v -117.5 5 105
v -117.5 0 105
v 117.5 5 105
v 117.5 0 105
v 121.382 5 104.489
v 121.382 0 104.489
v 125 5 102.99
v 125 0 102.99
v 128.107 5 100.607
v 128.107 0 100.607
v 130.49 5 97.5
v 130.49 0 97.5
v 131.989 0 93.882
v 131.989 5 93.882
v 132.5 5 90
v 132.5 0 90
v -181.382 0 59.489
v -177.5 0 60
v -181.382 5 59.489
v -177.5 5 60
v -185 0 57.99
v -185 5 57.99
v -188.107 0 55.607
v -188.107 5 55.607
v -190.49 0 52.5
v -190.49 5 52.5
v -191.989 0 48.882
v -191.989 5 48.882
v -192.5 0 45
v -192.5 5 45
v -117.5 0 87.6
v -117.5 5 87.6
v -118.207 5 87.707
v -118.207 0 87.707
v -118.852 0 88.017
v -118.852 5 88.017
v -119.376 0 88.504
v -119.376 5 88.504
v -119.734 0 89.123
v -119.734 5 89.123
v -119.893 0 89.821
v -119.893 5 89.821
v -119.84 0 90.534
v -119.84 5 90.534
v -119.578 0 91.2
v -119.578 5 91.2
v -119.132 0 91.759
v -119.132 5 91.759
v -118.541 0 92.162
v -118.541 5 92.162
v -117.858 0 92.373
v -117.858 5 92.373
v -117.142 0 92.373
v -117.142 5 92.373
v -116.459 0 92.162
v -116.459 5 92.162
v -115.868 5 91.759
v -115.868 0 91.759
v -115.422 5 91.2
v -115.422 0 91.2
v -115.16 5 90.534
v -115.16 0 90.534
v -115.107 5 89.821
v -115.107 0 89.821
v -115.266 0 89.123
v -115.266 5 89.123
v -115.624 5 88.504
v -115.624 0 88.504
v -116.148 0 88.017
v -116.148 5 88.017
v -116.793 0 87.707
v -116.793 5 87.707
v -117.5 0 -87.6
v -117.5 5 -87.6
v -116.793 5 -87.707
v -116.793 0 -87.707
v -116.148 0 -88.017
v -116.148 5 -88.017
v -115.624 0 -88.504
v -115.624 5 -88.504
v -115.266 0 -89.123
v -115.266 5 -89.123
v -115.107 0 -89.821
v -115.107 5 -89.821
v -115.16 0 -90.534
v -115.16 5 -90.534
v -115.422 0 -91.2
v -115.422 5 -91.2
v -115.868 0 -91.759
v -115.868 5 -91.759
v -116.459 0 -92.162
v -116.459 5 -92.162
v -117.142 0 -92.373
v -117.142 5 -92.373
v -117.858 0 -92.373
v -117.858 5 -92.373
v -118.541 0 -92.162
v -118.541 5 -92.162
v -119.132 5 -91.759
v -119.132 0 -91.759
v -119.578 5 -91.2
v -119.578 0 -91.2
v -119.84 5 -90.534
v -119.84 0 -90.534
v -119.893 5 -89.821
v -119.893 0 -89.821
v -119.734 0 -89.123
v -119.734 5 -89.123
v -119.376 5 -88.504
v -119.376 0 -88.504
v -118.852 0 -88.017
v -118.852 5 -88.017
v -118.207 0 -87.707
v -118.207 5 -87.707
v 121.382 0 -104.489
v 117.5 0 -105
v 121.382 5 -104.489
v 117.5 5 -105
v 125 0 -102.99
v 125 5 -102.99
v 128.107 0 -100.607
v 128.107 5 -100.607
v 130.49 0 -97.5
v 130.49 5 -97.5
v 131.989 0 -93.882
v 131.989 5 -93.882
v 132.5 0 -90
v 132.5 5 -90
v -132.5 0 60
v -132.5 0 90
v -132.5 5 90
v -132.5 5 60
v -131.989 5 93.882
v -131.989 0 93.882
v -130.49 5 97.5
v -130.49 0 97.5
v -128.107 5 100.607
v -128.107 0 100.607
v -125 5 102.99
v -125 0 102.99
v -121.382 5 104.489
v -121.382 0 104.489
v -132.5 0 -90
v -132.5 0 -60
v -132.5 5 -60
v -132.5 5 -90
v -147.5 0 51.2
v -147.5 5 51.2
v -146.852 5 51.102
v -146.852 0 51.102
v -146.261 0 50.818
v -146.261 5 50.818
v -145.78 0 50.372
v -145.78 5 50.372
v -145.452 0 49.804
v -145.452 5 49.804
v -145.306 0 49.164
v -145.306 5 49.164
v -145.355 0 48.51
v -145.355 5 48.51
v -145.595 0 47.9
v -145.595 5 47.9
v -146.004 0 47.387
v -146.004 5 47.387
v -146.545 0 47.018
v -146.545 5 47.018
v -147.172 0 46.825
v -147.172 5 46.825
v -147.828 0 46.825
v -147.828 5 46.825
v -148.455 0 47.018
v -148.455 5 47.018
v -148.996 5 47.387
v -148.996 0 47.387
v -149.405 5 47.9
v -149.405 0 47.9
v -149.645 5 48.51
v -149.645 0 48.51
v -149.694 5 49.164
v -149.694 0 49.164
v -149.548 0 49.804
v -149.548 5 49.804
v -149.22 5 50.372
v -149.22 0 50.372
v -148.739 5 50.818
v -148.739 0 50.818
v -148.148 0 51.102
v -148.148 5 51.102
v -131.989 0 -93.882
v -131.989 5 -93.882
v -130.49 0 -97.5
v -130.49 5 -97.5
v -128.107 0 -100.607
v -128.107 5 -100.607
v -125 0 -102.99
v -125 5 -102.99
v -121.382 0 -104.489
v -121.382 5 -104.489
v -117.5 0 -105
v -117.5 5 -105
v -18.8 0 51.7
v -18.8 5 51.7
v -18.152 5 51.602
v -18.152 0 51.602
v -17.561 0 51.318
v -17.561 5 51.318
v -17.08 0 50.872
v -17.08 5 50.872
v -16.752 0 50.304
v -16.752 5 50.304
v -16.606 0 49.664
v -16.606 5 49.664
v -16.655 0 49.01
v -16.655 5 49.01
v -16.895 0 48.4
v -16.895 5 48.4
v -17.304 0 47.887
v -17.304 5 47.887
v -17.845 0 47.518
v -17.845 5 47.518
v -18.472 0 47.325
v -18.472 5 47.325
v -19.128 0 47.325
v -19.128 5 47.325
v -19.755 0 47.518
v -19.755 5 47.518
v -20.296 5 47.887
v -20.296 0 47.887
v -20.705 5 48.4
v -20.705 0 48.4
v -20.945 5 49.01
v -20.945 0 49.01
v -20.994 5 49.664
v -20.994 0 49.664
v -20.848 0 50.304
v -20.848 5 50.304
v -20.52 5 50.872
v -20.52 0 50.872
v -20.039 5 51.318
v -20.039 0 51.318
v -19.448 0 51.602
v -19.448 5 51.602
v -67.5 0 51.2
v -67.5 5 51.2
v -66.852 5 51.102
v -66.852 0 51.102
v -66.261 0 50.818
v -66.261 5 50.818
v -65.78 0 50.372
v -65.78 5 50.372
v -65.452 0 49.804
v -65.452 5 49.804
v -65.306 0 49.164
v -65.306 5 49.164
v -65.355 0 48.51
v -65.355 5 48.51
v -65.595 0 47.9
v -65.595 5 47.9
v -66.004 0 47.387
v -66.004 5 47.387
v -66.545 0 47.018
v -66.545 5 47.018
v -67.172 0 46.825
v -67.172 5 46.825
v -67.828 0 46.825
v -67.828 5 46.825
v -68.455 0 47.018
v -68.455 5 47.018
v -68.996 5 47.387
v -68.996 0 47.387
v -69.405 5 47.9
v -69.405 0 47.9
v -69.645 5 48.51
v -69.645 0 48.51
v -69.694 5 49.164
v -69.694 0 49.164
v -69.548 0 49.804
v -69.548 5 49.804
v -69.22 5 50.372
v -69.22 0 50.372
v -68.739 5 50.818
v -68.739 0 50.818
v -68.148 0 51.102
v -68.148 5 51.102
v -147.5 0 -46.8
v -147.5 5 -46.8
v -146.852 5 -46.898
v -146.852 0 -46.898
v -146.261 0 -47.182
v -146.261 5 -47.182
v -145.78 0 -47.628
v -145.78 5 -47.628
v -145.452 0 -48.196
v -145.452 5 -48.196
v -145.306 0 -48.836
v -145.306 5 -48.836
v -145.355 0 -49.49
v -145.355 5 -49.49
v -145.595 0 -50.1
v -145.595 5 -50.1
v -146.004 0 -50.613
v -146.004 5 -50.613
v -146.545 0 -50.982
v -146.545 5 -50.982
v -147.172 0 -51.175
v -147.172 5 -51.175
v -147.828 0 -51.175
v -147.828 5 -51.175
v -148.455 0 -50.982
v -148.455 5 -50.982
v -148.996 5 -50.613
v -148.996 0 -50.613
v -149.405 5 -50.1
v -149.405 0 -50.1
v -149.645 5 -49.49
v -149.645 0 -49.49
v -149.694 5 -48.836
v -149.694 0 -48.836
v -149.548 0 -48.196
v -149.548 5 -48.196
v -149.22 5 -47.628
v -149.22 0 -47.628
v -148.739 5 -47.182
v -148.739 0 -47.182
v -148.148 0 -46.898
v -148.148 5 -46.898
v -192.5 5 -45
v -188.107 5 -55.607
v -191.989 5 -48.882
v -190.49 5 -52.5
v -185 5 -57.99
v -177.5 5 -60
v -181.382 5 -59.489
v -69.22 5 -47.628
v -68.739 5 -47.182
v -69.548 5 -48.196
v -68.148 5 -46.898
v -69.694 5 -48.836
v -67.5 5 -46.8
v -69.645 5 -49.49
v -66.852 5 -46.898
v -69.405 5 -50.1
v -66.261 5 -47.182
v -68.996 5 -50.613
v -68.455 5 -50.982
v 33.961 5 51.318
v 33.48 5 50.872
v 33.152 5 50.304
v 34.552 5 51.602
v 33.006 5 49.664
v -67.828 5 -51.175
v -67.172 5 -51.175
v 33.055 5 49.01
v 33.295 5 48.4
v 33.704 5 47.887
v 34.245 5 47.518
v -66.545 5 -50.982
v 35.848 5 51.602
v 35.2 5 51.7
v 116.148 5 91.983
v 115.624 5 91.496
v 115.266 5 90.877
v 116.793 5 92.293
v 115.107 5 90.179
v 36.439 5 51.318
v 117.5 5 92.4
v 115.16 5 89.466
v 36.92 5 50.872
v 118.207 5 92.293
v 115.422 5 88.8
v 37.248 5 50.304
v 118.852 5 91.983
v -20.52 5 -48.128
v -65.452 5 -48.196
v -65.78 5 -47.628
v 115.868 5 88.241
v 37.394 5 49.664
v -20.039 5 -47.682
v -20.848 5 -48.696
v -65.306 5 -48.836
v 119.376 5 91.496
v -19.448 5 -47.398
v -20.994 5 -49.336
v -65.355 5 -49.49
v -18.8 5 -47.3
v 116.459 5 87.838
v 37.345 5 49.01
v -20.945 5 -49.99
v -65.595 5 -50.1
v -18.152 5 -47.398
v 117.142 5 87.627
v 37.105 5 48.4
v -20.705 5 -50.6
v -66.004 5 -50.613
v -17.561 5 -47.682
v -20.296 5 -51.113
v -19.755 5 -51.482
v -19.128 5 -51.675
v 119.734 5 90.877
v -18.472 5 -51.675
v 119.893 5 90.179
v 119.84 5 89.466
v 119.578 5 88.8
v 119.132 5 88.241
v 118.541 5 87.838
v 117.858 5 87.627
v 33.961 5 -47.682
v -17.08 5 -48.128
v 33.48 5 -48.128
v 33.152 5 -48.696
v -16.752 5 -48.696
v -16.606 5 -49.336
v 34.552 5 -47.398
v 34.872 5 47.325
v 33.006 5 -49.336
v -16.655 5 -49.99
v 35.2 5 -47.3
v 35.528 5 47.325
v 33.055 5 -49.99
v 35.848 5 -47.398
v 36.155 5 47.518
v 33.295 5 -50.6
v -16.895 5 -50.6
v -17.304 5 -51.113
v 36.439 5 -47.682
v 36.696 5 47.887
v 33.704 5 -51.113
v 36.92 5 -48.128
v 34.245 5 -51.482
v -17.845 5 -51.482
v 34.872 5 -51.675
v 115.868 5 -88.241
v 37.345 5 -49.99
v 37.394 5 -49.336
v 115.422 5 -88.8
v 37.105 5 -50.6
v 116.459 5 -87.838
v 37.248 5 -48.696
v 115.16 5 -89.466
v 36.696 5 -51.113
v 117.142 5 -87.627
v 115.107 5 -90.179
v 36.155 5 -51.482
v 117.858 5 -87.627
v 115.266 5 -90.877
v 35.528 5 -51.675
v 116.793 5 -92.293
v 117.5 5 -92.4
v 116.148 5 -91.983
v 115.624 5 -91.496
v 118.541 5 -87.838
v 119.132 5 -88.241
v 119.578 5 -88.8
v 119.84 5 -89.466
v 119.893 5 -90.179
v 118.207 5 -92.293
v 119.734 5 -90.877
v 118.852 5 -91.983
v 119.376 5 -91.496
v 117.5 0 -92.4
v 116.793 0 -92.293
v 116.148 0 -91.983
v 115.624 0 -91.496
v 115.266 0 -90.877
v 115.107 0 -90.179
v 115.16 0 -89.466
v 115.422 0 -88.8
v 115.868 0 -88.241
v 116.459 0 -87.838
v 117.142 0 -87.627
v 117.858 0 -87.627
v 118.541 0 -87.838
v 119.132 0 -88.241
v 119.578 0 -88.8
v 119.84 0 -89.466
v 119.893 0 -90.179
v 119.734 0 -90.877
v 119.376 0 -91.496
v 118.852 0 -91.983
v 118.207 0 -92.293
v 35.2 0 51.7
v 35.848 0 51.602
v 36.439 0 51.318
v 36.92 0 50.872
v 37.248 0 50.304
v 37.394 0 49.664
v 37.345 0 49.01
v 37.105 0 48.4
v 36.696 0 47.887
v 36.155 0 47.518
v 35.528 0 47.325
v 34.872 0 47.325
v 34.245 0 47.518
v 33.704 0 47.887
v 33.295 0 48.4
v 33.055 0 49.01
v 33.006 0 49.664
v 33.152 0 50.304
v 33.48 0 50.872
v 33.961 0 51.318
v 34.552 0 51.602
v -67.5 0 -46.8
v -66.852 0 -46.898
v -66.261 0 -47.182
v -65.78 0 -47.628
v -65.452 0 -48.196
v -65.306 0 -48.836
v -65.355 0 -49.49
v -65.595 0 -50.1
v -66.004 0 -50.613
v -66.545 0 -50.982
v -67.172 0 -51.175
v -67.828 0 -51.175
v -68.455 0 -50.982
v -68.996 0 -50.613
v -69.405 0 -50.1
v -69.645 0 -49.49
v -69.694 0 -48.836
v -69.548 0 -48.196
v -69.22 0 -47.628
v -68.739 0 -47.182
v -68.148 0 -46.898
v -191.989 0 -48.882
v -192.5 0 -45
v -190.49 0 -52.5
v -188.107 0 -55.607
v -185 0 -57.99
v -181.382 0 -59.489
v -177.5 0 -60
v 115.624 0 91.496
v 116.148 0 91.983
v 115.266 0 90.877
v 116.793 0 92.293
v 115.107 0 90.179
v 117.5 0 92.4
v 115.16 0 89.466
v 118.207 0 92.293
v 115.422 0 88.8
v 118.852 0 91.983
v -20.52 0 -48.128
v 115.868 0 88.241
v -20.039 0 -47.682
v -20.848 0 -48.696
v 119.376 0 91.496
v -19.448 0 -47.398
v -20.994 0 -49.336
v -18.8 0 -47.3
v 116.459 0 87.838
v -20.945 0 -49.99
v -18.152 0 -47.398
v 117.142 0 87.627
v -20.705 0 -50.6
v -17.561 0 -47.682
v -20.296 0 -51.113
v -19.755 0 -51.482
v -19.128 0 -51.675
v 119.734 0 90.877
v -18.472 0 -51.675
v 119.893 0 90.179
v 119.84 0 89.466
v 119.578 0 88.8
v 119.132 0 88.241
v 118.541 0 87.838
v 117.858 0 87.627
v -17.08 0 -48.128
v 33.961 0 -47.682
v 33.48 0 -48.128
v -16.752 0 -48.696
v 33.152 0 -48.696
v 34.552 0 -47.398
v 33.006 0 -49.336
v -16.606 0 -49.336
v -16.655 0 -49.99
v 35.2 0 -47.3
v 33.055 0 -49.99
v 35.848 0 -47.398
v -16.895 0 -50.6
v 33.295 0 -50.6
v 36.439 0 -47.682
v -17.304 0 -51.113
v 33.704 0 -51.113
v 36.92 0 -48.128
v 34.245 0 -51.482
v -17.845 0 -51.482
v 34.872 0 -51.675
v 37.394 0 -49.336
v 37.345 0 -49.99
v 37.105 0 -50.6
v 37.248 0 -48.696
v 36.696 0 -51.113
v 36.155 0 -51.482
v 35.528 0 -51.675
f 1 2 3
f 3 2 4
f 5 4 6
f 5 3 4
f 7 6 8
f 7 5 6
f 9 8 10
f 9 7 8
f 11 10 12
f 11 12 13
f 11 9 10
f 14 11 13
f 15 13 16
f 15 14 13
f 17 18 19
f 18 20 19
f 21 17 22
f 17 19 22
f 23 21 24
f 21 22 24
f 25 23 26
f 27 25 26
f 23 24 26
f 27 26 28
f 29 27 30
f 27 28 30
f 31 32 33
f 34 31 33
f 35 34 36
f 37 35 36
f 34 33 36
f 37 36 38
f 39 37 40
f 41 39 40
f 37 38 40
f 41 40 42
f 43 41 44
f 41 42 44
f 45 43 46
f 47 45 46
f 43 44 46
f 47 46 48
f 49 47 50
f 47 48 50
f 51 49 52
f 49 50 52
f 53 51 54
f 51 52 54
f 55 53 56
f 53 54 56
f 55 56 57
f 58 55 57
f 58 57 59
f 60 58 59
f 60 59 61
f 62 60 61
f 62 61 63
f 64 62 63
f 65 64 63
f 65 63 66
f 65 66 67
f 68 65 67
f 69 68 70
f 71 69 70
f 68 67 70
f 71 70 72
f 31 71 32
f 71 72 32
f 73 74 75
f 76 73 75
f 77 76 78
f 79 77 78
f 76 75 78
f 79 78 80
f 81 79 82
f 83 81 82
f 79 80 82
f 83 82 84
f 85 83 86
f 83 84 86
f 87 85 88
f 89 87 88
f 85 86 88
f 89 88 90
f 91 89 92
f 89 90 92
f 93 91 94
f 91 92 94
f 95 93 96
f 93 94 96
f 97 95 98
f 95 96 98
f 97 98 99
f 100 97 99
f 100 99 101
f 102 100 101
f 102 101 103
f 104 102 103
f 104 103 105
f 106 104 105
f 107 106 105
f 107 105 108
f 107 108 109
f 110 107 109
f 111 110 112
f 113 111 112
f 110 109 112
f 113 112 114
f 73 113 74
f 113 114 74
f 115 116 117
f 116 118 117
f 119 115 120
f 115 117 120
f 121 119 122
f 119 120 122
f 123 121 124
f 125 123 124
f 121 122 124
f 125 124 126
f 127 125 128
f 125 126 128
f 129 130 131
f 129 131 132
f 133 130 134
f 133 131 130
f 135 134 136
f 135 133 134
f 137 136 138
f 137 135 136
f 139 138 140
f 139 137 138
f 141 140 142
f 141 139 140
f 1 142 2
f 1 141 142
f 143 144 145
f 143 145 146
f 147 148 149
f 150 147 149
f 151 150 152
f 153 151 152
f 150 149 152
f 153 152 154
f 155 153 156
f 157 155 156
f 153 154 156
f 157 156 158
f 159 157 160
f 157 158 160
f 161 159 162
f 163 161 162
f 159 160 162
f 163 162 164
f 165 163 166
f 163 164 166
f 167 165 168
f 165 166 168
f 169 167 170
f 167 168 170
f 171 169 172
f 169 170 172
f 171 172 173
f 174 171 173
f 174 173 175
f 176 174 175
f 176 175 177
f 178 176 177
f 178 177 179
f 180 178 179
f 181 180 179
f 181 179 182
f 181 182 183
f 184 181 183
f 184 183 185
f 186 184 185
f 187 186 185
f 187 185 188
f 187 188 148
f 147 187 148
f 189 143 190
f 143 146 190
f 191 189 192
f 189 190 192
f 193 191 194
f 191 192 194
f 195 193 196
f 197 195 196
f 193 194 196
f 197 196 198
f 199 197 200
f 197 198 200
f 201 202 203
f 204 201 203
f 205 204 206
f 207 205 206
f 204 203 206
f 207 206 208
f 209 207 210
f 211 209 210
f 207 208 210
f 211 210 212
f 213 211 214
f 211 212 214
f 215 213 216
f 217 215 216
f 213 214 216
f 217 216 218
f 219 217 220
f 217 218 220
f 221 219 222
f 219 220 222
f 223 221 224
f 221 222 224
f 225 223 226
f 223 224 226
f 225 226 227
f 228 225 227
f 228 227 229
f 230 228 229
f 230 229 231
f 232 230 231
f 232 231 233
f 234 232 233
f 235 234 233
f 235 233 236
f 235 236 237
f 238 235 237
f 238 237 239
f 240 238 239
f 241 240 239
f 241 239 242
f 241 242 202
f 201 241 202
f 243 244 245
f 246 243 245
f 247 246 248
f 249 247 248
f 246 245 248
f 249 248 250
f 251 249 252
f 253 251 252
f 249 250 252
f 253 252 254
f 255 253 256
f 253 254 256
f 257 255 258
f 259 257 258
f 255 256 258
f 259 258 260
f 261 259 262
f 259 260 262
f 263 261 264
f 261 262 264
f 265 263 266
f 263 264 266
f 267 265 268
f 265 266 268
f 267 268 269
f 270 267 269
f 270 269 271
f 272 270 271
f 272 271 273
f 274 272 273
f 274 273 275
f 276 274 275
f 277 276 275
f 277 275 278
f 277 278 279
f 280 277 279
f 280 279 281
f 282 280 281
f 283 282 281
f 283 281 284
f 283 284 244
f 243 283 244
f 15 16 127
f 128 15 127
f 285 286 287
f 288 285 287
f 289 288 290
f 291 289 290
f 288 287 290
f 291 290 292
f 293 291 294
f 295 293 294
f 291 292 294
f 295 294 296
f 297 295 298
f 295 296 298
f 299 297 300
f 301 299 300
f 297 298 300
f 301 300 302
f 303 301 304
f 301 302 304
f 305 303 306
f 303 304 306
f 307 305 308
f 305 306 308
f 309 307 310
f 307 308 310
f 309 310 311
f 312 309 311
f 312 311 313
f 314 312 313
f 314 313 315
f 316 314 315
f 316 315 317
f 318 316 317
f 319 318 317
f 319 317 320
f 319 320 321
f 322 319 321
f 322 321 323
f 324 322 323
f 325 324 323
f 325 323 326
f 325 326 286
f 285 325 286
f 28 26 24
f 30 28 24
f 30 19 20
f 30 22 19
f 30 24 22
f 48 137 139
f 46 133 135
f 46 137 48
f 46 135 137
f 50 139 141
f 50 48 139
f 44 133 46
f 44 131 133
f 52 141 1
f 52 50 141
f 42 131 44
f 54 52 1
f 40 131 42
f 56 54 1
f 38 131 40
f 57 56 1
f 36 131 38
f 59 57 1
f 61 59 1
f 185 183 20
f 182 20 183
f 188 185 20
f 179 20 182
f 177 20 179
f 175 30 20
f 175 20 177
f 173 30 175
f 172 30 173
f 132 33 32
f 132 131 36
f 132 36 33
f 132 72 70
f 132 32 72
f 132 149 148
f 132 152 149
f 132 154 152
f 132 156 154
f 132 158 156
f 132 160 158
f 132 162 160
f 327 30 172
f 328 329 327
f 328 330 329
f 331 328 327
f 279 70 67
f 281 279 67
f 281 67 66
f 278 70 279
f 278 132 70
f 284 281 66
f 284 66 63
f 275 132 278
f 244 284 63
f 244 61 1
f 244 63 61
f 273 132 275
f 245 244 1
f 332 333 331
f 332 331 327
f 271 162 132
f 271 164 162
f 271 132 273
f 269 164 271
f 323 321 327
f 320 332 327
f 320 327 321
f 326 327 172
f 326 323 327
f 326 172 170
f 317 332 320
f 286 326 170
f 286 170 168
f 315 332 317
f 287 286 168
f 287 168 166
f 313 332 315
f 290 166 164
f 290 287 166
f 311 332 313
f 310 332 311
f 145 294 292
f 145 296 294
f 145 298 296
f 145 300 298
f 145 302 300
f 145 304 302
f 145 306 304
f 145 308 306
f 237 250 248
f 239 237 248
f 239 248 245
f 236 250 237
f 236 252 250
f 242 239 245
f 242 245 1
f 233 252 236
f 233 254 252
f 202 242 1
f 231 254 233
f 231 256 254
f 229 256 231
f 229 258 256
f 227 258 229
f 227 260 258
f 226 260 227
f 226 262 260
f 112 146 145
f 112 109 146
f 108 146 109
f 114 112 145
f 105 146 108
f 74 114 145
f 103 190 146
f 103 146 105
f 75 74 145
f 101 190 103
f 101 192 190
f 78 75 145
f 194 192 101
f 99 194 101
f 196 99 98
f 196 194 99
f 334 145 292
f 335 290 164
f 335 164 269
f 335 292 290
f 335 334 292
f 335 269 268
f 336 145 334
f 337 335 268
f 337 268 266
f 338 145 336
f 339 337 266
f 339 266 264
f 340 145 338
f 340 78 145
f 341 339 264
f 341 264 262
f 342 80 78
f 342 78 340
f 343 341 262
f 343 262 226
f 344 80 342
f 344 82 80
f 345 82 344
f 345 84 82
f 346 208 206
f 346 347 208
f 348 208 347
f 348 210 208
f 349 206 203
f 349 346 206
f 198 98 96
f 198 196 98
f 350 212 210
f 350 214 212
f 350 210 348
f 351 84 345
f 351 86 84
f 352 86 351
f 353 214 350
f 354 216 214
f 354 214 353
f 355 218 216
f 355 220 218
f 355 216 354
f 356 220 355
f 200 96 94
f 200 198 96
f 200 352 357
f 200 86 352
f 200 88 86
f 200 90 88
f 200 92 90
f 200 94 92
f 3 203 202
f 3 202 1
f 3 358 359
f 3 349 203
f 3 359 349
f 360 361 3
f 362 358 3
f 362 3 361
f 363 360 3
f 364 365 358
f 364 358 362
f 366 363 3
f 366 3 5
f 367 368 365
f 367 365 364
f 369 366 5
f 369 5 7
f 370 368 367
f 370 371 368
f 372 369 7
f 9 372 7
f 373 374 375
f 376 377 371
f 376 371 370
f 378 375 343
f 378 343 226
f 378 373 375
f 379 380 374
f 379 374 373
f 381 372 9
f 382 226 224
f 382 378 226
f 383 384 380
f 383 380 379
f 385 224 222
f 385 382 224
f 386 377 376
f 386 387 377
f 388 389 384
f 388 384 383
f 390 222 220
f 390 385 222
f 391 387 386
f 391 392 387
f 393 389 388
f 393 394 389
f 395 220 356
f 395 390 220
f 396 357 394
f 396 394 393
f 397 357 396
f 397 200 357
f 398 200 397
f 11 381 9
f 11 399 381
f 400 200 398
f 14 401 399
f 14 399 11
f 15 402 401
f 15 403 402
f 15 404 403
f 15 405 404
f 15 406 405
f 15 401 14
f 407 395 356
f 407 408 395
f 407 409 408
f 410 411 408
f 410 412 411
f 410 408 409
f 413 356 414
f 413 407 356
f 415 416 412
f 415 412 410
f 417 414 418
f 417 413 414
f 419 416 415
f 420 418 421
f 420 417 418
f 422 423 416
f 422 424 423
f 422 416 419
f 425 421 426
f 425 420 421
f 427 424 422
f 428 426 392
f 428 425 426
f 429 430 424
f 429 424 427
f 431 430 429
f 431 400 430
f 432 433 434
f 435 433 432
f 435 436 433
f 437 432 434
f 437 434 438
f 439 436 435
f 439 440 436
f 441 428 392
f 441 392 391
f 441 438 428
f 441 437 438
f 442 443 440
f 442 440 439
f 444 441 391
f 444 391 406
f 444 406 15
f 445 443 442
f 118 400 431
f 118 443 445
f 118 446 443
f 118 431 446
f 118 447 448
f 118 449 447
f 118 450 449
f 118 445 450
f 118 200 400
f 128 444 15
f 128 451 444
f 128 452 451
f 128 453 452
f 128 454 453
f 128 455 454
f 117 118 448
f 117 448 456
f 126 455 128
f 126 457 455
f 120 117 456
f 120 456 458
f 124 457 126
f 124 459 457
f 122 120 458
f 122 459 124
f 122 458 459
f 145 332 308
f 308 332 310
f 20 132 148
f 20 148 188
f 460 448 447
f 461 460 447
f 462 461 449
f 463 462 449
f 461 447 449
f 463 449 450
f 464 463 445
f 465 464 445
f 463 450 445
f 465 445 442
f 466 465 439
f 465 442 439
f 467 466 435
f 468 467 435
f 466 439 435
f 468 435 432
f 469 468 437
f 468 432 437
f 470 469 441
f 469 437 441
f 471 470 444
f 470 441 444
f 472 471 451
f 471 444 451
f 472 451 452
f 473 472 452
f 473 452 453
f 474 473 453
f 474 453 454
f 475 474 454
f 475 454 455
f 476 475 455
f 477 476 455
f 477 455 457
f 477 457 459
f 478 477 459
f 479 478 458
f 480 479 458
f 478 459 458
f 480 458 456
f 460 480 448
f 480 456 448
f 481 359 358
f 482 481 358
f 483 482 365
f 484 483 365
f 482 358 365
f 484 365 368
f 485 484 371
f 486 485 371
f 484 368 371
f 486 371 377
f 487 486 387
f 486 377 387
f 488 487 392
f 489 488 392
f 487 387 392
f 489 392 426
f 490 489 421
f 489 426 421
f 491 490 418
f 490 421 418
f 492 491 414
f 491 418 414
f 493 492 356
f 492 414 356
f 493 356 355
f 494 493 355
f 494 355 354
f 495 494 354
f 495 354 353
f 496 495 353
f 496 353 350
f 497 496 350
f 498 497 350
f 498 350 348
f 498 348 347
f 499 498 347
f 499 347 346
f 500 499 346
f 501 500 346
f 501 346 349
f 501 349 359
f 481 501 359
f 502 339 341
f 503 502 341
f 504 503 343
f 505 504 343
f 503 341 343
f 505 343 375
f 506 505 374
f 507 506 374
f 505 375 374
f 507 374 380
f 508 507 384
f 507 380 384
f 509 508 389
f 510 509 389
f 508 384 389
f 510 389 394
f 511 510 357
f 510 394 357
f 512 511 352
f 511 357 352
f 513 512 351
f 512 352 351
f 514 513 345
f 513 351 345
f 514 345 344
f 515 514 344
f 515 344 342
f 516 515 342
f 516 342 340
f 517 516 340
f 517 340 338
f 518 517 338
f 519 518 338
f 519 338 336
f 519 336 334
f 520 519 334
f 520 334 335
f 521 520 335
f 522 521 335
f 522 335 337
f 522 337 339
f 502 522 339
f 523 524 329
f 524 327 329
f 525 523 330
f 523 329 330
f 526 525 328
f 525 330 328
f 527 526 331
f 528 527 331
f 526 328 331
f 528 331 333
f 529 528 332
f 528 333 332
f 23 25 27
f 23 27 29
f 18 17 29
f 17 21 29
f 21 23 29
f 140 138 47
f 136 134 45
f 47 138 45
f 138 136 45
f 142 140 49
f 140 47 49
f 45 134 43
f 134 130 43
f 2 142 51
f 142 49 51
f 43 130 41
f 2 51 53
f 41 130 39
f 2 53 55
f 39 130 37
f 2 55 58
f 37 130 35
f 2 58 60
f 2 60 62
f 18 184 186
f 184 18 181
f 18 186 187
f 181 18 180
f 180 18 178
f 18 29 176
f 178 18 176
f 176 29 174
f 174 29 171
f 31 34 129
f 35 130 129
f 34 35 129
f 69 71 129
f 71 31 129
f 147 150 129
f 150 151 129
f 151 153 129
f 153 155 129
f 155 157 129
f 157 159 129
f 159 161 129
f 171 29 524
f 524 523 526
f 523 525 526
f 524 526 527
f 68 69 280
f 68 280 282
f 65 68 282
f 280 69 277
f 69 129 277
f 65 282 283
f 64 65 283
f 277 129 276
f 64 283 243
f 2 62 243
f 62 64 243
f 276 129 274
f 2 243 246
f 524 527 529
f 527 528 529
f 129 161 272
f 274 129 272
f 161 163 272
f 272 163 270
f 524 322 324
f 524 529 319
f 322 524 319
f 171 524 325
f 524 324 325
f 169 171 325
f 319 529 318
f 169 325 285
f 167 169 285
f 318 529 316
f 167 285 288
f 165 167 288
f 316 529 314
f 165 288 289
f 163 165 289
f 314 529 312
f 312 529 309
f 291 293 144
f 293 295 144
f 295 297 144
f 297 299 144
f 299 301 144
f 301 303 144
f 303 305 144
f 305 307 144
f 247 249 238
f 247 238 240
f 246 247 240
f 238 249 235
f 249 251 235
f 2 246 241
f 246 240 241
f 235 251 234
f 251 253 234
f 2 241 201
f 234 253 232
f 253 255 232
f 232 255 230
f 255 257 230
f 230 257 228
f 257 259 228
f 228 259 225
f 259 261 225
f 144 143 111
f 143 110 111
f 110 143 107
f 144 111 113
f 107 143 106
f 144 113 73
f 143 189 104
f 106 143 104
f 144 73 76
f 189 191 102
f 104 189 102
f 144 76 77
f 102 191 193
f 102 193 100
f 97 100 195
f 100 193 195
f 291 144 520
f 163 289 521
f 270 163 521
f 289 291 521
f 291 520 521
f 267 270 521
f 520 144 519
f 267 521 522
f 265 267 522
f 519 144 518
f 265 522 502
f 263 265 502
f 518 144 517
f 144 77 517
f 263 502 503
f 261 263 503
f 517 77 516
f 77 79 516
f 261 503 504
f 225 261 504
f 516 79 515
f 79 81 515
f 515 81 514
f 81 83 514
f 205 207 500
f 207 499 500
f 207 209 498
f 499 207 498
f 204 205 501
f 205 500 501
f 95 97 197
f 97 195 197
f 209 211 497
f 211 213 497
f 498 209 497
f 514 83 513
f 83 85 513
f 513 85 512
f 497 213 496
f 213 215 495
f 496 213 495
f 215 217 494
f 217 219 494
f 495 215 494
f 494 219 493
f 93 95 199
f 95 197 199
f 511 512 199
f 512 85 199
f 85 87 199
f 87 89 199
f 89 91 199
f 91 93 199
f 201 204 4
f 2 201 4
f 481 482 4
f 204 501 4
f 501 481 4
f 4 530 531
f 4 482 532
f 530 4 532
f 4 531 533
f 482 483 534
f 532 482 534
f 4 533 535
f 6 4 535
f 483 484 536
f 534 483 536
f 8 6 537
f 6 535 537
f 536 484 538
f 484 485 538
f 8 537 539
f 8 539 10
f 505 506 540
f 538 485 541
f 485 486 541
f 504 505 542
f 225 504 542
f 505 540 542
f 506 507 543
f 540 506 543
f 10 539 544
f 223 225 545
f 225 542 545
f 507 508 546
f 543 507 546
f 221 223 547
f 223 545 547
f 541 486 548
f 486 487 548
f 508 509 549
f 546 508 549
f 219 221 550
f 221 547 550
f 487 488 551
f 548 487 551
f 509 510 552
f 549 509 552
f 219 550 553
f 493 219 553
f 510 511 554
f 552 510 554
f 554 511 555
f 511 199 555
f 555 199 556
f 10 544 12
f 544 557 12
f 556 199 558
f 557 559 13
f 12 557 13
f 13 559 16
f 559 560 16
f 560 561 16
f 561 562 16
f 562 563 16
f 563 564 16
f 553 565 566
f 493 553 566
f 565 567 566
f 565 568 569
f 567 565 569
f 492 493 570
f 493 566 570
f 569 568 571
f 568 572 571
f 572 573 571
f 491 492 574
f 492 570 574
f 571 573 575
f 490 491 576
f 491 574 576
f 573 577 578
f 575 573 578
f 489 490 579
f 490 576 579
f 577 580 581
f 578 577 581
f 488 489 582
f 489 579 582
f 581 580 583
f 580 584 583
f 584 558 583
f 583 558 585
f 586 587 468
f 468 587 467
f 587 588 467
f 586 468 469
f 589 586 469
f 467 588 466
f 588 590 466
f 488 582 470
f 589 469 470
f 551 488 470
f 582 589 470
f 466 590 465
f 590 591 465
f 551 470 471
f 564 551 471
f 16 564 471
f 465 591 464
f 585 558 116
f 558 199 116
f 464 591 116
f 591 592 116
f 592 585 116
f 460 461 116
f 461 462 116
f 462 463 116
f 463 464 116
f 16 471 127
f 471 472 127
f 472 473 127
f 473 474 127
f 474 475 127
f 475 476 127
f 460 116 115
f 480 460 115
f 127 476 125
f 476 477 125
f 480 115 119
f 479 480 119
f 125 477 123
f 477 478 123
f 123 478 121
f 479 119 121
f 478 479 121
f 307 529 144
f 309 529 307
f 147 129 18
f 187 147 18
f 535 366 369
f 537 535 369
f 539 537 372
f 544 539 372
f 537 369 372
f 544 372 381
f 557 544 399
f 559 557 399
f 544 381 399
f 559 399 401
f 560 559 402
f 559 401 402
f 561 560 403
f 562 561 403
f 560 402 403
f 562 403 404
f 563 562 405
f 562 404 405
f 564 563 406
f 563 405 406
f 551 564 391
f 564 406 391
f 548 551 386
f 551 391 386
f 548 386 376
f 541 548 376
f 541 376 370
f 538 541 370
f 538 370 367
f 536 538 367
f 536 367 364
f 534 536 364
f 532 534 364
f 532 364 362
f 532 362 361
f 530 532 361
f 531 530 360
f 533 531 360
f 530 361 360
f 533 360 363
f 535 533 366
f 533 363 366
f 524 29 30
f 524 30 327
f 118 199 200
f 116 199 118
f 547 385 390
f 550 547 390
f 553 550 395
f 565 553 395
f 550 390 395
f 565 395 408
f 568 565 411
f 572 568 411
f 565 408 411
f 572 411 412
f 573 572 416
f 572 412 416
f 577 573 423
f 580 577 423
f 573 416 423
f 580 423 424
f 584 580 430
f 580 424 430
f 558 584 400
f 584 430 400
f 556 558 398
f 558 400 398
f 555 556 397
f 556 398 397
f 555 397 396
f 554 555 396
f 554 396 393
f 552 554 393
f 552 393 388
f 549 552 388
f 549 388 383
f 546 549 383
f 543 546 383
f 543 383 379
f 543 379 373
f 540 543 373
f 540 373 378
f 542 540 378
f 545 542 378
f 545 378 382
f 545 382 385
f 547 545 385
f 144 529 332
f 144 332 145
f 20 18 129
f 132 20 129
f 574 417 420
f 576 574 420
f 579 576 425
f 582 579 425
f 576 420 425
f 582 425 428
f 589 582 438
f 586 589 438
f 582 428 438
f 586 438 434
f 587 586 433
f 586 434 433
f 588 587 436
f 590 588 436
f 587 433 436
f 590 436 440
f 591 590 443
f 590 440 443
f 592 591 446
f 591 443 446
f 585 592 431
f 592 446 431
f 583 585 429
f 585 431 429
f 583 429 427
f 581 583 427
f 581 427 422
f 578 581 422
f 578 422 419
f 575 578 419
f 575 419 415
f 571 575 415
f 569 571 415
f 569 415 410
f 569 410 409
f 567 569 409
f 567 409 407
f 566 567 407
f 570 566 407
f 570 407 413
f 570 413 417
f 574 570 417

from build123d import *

# Parameters (mm, degrees)
SKETCH_1_W          = 265
SKETCH_1_H          = 210
EXTRUDE_1_DEPTH     = 5
SKETCH_3_R          = 2.4
CUT_EXTRUDE_1_DEPTH = 5
FILLET_1_R          = 15
SKETCH_4_W          = 60
SKETCH_4_H          = 120
EXTRUDE_3_DEPTH     = 5
FILLET_2_R          = 15
SKETCH_6_R          = 2.2
CUT_EXTRUDE_2_DEPTH = 24
SKETCH_7_R          = 2.2
CUT_EXTRUDE_3_DEPTH = 10


with BuildPart() as part:
    # 草图1 → 凸台-拉伸1 (new body)
    with BuildSketch(Plane(origin=(0, 0, 0), x_dir=(1, 0, 0), z_dir=(0, 1, 0))):
        Rectangle(SKETCH_1_W, SKETCH_1_H)
    extrude(amount=EXTRUDE_1_DEPTH)

    # 草图3 → 切除-拉伸1 (cut)
    with BuildSketch(Plane(origin=(0, 5, 0), x_dir=(1, 0, 0), z_dir=(0, 1, 0))):
        with Locations(Location((-117.5, 90, 0), (0, 0, 270))):
            Circle(SKETCH_3_R)
        with Locations(Location((117.5, 90, 0), (0, 0, 90))):
            Circle(SKETCH_3_R)
        with Locations(Location((117.5, -90, 0), (0, 0, 270))):
            Circle(SKETCH_3_R)
        with Locations(Location((-117.5, -90, 0), (0, 0, 90))):
            Circle(SKETCH_3_R)
    extrude(amount=-CUT_EXTRUDE_1_DEPTH, mode=Mode.SUBTRACT)

    # 圆角1
    fillet_1_edges = [part.edges().sort_by_distance(p)[0] for p in [
        (-132.5, 2.5, -105),
        (132.5, 2.5, -105),
        (132.5, 2.5, 105),
        (-132.5, 2.5, 105),
    ]]
    fillet(fillet_1_edges, radius=FILLET_1_R)

    # 草图4 → 凸台-拉伸3 (add)
    with BuildSketch(Plane(origin=(0, 0, 0), x_dir=(1, 0, 0), z_dir=(0, 1, 0))):
        with Locations((-162.5, 0)):
            Rectangle(SKETCH_4_W, SKETCH_4_H)
    extrude(amount=EXTRUDE_3_DEPTH)

    # 圆角2
    fillet_2_edges = [part.edges().sort_by_distance(p)[0] for p in [
        (-192.5, 2.5, -60),
        (-192.5, 2.5, 60),
    ]]
    fillet(fillet_2_edges, radius=FILLET_2_R)

    # 草图6 → 切除-拉伸2 (cut)
    with BuildSketch(Plane(origin=(0, 5, 0), x_dir=(1, 0, 0), z_dir=(0, 1, 0))):
        with Locations(Location((-147.5, 49, 0), (0, 0, 270))):
            Circle(SKETCH_6_R)
        with Locations(Location((-67.5, 49, 0), (0, 0, 270))):
            Circle(SKETCH_6_R)
        with Locations(Location((-67.5, -49, 0), (0, 0, 270))):
            Circle(SKETCH_6_R)
        with Locations(Location((-147.5, -49, 0), (0, 0, 270))):
            Circle(SKETCH_6_R)
    extrude(amount=-CUT_EXTRUDE_2_DEPTH, mode=Mode.SUBTRACT)

    # 草图7 → 切除-拉伸3 (cut)
    with BuildSketch(Plane(origin=(0, 5, 0), x_dir=(1, 0, 0), z_dir=(0, 1, 0))):
        with Locations(Location((-18.8, 49.5, 0), (0, 0, 270))):
            Circle(SKETCH_7_R)
        with Locations(Location((35.2, 49.5, 0), (0, 0, 270))):
            Circle(SKETCH_7_R)
        with Locations(Location((35.2, -49.5, 0), (0, 0, 270))):
            Circle(SKETCH_7_R)
        with Locations(Location((-18.8, -49.5, 0), (0, 0, 270))):
            Circle(SKETCH_7_R)
    extrude(amount=-CUT_EXTRUDE_3_DEPTH, mode=Mode.SUBTRACT)


solid = part.part
